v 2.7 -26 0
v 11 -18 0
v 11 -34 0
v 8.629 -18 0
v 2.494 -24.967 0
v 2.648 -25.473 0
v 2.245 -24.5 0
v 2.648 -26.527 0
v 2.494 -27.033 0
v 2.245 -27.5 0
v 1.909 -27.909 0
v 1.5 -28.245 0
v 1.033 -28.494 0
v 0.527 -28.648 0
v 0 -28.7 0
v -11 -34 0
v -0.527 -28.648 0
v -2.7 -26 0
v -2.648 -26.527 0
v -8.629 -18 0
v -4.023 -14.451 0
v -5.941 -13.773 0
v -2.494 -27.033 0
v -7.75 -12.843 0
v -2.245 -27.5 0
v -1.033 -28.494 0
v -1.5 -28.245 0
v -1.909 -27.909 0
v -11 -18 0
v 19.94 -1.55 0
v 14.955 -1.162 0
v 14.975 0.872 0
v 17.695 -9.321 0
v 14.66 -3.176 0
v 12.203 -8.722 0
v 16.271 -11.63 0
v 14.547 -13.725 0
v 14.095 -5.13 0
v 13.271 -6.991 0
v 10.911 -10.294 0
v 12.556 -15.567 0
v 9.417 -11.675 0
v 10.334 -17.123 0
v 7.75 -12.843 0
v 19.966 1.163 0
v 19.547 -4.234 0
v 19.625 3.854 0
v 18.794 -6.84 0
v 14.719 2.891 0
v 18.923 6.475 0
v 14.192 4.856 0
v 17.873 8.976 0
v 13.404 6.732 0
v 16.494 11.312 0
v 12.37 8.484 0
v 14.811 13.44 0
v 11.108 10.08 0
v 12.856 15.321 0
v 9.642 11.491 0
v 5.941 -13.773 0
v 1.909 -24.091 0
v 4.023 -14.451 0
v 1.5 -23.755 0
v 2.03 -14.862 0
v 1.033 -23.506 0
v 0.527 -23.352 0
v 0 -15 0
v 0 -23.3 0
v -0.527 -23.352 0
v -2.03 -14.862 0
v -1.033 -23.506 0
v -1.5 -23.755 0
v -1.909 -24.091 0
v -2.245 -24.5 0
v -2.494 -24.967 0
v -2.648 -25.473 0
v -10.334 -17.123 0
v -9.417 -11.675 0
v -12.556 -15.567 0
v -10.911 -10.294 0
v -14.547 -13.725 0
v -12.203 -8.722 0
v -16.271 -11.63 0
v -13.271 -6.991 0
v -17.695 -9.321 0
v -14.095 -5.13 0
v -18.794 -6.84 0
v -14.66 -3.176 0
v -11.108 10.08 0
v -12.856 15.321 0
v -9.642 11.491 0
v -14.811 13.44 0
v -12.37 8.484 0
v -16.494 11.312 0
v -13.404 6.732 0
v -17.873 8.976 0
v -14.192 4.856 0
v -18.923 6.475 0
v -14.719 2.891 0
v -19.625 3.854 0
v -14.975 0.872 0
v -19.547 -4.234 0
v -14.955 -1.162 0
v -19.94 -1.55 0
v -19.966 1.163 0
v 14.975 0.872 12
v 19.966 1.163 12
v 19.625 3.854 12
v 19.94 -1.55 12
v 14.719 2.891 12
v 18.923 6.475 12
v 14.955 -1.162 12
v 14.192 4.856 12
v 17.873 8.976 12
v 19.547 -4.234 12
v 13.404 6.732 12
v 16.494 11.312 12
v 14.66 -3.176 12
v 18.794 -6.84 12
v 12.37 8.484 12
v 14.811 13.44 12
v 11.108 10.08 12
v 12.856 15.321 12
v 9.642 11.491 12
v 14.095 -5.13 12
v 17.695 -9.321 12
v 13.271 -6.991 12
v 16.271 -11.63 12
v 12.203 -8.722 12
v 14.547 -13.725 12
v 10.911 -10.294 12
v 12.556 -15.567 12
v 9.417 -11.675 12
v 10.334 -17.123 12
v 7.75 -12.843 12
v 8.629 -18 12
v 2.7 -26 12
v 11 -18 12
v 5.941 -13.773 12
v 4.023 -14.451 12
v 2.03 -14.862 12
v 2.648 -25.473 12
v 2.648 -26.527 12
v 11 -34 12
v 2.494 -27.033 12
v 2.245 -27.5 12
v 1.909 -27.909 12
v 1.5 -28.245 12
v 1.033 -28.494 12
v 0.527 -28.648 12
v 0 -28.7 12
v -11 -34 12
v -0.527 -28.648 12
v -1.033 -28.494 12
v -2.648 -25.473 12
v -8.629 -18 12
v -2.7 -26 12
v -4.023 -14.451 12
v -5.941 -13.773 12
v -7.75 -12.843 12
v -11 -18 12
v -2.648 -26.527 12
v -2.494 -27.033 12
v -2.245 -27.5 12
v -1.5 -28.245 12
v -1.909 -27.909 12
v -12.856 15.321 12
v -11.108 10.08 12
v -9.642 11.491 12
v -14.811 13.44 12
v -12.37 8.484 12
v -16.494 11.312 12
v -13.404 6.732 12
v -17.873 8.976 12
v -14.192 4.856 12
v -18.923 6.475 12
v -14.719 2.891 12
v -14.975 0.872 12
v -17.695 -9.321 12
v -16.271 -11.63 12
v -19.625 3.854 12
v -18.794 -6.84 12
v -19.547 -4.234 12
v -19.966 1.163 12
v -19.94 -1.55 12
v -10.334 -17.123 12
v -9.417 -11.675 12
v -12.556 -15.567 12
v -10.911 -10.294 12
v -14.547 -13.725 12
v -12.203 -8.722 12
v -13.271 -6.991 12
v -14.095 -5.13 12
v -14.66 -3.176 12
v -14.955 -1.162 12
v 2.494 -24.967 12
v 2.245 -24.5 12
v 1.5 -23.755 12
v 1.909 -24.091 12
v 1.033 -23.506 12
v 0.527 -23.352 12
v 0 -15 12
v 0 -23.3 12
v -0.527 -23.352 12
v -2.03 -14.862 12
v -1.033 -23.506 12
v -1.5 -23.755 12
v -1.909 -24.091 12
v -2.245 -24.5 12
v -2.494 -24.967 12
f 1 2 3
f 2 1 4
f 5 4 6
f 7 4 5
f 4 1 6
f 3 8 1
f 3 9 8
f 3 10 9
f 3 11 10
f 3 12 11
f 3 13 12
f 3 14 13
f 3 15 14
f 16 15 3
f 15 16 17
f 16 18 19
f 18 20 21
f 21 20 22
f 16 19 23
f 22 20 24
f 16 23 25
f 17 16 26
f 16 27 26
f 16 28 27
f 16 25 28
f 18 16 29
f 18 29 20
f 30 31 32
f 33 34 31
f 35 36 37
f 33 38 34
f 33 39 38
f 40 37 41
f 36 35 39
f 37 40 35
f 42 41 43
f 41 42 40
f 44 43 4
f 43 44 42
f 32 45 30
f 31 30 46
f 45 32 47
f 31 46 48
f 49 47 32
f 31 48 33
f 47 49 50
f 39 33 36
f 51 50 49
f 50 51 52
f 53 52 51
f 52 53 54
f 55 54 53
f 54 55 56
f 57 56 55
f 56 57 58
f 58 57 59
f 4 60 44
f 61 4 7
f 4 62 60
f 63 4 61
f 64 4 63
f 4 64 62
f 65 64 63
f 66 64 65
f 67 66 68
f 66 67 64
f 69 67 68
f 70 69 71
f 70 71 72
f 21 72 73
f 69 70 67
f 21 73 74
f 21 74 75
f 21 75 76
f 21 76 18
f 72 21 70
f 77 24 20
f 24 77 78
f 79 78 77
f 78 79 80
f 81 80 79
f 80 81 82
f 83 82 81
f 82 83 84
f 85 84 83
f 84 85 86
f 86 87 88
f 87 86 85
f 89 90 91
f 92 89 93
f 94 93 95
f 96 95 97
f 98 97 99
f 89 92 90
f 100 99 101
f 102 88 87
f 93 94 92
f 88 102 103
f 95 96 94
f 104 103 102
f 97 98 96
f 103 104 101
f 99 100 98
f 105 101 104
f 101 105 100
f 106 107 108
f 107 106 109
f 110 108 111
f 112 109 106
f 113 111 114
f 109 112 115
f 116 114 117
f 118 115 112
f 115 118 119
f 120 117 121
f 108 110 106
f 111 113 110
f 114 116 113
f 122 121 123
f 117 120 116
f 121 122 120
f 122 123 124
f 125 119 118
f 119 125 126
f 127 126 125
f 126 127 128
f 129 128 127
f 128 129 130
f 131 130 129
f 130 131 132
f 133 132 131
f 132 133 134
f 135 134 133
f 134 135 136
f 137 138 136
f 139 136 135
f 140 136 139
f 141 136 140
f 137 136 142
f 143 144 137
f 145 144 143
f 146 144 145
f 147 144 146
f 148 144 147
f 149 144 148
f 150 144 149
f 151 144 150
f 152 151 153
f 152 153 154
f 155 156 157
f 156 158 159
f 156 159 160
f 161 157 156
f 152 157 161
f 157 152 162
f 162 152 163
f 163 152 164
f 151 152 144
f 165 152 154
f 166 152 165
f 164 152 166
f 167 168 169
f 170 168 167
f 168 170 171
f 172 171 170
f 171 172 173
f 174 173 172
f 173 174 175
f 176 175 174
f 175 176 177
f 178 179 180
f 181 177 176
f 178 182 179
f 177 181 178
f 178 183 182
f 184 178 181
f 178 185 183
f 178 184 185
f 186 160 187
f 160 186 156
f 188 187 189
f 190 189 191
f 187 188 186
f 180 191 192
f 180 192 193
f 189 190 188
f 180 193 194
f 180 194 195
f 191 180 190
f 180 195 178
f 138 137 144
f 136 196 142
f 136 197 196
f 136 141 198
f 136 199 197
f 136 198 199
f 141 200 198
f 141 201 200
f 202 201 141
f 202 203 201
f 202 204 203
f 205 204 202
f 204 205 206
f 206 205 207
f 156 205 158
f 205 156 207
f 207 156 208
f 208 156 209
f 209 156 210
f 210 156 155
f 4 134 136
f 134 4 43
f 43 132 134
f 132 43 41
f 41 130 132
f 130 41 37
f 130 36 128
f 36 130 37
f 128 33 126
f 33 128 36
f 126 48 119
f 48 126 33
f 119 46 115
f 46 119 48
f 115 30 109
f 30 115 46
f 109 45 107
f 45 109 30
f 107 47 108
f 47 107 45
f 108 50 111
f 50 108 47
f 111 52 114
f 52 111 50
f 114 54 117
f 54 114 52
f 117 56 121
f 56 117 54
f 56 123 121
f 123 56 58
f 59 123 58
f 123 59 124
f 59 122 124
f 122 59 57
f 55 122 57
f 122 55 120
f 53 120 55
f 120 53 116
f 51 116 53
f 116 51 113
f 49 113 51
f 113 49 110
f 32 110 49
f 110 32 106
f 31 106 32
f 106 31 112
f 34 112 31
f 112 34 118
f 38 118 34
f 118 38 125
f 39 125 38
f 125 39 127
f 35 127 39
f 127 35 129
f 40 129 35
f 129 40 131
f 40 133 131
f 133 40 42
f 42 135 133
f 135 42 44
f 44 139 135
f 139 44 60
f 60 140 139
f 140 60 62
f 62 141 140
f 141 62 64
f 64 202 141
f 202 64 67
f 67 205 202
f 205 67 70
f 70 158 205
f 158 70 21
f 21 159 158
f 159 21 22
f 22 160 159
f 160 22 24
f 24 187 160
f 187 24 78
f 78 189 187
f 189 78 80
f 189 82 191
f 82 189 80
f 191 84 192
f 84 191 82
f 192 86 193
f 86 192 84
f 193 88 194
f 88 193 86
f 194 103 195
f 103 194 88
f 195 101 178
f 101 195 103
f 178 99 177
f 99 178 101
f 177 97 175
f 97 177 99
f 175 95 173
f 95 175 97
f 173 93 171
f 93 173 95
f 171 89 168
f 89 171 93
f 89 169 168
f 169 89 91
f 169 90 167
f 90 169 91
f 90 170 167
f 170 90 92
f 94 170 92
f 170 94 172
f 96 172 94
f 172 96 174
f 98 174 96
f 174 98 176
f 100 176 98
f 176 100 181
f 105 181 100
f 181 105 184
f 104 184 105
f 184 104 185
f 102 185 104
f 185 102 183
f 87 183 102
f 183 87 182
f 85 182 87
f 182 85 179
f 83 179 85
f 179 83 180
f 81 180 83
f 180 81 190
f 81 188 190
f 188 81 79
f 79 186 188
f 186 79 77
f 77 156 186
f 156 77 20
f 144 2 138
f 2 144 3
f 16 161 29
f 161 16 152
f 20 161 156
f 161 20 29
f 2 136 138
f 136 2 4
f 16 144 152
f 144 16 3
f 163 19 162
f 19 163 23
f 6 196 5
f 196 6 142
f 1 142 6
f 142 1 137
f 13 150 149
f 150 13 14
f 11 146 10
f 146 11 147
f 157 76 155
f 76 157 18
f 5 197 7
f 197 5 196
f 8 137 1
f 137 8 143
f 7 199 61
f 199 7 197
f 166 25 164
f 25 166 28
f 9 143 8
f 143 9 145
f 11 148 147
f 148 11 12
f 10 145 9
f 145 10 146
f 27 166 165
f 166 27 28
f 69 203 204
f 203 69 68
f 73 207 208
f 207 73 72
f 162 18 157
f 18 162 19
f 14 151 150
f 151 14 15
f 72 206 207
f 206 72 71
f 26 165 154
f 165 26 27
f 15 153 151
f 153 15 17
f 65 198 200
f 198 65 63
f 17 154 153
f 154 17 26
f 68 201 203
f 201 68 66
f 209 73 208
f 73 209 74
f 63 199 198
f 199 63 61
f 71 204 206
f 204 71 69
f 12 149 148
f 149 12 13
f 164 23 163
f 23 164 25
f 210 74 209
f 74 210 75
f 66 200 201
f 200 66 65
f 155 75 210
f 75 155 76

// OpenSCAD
$fn = 32;

// ----------------------------------------------------------------------
// Spring clip: 40 mm outside, 5 mm band, 80 degree opening
// ----------------------------------------------------------------------

// --- parameters (mm) ---
outer_r = 20;             // clip outside radius
inner_r = 15;             // clip bore radius
band = 5;                 // band thickness
clip_w = 12;              // clip width
opening = 80;             // opening angle
tab_w = 22;               // tab width
tab_len = 14;             // tab length past the clip
tab_hole = 5.4;           // tab fixing hole

clip_profile = [[-12.856, 15.321], [-14.811, 13.44], [-16.494, 11.312], [-17.873, 8.976], [-18.923, 6.475], [-19.625, 3.854], [-19.966, 1.163], [-19.94, -1.55], [-19.547, -4.234], [-18.794, -6.84], [-17.695, -9.321], [-16.271, -11.63], [-14.547, -13.725], [-12.556, -15.567], [-10.334, -17.123], [-7.922, -18.364], [-5.363, -19.267], [-2.707, -19.816], [0, -20], [2.707, -19.816], [5.363, -19.267], [7.922, -18.364], [10.334, -17.123], [12.556, -15.567], [14.547, -13.725], [16.271, -11.63], [17.695, -9.321], [18.794, -6.84], [19.547, -4.234], [19.94, -1.55], [19.966, 1.163], [19.625, 3.854], [18.923, 6.475], [17.873, 8.976], [16.494, 11.312], [14.811, 13.44], [12.856, 15.321], [9.642, 11.491], [11.108, 10.08], [12.37, 8.484], [13.404, 6.732], [14.192, 4.856], [14.719, 2.891], [14.975, 0.872], [14.955, -1.162], [14.66, -3.176], [14.095, -5.13], [13.271, -6.991], [12.203, -8.722], [10.911, -10.294], [9.417, -11.675], [7.75, -12.843], [5.941, -13.773], [4.023, -14.451], [2.03, -14.862], [0, -15], [-2.03, -14.862], [-4.023, -14.451], [-5.941, -13.773], [-7.75, -12.843], [-9.417, -11.675], [-10.911, -10.294], [-12.203, -8.722], [-13.271, -6.991], [-14.095, -5.13], [-14.66, -3.176], [-14.955, -1.162], [-14.975, 0.872], [-14.719, 2.891], [-14.192, 4.856], [-13.404, 6.732], [-12.37, 8.484], [-11.108, 10.08], [-9.642, 11.491]];

difference() {
  union() {
    linear_extrude(height = clip_w) polygon(clip_profile);
    /* mounting tab, sunk 2 mm into the band */
    translate([-11, -34, 0]) cube([tab_w, 16, clip_w]);
  }
  translate([0, -26, -2.5]) cylinder(h = clip_w + 5, d = tab_hole);
}
